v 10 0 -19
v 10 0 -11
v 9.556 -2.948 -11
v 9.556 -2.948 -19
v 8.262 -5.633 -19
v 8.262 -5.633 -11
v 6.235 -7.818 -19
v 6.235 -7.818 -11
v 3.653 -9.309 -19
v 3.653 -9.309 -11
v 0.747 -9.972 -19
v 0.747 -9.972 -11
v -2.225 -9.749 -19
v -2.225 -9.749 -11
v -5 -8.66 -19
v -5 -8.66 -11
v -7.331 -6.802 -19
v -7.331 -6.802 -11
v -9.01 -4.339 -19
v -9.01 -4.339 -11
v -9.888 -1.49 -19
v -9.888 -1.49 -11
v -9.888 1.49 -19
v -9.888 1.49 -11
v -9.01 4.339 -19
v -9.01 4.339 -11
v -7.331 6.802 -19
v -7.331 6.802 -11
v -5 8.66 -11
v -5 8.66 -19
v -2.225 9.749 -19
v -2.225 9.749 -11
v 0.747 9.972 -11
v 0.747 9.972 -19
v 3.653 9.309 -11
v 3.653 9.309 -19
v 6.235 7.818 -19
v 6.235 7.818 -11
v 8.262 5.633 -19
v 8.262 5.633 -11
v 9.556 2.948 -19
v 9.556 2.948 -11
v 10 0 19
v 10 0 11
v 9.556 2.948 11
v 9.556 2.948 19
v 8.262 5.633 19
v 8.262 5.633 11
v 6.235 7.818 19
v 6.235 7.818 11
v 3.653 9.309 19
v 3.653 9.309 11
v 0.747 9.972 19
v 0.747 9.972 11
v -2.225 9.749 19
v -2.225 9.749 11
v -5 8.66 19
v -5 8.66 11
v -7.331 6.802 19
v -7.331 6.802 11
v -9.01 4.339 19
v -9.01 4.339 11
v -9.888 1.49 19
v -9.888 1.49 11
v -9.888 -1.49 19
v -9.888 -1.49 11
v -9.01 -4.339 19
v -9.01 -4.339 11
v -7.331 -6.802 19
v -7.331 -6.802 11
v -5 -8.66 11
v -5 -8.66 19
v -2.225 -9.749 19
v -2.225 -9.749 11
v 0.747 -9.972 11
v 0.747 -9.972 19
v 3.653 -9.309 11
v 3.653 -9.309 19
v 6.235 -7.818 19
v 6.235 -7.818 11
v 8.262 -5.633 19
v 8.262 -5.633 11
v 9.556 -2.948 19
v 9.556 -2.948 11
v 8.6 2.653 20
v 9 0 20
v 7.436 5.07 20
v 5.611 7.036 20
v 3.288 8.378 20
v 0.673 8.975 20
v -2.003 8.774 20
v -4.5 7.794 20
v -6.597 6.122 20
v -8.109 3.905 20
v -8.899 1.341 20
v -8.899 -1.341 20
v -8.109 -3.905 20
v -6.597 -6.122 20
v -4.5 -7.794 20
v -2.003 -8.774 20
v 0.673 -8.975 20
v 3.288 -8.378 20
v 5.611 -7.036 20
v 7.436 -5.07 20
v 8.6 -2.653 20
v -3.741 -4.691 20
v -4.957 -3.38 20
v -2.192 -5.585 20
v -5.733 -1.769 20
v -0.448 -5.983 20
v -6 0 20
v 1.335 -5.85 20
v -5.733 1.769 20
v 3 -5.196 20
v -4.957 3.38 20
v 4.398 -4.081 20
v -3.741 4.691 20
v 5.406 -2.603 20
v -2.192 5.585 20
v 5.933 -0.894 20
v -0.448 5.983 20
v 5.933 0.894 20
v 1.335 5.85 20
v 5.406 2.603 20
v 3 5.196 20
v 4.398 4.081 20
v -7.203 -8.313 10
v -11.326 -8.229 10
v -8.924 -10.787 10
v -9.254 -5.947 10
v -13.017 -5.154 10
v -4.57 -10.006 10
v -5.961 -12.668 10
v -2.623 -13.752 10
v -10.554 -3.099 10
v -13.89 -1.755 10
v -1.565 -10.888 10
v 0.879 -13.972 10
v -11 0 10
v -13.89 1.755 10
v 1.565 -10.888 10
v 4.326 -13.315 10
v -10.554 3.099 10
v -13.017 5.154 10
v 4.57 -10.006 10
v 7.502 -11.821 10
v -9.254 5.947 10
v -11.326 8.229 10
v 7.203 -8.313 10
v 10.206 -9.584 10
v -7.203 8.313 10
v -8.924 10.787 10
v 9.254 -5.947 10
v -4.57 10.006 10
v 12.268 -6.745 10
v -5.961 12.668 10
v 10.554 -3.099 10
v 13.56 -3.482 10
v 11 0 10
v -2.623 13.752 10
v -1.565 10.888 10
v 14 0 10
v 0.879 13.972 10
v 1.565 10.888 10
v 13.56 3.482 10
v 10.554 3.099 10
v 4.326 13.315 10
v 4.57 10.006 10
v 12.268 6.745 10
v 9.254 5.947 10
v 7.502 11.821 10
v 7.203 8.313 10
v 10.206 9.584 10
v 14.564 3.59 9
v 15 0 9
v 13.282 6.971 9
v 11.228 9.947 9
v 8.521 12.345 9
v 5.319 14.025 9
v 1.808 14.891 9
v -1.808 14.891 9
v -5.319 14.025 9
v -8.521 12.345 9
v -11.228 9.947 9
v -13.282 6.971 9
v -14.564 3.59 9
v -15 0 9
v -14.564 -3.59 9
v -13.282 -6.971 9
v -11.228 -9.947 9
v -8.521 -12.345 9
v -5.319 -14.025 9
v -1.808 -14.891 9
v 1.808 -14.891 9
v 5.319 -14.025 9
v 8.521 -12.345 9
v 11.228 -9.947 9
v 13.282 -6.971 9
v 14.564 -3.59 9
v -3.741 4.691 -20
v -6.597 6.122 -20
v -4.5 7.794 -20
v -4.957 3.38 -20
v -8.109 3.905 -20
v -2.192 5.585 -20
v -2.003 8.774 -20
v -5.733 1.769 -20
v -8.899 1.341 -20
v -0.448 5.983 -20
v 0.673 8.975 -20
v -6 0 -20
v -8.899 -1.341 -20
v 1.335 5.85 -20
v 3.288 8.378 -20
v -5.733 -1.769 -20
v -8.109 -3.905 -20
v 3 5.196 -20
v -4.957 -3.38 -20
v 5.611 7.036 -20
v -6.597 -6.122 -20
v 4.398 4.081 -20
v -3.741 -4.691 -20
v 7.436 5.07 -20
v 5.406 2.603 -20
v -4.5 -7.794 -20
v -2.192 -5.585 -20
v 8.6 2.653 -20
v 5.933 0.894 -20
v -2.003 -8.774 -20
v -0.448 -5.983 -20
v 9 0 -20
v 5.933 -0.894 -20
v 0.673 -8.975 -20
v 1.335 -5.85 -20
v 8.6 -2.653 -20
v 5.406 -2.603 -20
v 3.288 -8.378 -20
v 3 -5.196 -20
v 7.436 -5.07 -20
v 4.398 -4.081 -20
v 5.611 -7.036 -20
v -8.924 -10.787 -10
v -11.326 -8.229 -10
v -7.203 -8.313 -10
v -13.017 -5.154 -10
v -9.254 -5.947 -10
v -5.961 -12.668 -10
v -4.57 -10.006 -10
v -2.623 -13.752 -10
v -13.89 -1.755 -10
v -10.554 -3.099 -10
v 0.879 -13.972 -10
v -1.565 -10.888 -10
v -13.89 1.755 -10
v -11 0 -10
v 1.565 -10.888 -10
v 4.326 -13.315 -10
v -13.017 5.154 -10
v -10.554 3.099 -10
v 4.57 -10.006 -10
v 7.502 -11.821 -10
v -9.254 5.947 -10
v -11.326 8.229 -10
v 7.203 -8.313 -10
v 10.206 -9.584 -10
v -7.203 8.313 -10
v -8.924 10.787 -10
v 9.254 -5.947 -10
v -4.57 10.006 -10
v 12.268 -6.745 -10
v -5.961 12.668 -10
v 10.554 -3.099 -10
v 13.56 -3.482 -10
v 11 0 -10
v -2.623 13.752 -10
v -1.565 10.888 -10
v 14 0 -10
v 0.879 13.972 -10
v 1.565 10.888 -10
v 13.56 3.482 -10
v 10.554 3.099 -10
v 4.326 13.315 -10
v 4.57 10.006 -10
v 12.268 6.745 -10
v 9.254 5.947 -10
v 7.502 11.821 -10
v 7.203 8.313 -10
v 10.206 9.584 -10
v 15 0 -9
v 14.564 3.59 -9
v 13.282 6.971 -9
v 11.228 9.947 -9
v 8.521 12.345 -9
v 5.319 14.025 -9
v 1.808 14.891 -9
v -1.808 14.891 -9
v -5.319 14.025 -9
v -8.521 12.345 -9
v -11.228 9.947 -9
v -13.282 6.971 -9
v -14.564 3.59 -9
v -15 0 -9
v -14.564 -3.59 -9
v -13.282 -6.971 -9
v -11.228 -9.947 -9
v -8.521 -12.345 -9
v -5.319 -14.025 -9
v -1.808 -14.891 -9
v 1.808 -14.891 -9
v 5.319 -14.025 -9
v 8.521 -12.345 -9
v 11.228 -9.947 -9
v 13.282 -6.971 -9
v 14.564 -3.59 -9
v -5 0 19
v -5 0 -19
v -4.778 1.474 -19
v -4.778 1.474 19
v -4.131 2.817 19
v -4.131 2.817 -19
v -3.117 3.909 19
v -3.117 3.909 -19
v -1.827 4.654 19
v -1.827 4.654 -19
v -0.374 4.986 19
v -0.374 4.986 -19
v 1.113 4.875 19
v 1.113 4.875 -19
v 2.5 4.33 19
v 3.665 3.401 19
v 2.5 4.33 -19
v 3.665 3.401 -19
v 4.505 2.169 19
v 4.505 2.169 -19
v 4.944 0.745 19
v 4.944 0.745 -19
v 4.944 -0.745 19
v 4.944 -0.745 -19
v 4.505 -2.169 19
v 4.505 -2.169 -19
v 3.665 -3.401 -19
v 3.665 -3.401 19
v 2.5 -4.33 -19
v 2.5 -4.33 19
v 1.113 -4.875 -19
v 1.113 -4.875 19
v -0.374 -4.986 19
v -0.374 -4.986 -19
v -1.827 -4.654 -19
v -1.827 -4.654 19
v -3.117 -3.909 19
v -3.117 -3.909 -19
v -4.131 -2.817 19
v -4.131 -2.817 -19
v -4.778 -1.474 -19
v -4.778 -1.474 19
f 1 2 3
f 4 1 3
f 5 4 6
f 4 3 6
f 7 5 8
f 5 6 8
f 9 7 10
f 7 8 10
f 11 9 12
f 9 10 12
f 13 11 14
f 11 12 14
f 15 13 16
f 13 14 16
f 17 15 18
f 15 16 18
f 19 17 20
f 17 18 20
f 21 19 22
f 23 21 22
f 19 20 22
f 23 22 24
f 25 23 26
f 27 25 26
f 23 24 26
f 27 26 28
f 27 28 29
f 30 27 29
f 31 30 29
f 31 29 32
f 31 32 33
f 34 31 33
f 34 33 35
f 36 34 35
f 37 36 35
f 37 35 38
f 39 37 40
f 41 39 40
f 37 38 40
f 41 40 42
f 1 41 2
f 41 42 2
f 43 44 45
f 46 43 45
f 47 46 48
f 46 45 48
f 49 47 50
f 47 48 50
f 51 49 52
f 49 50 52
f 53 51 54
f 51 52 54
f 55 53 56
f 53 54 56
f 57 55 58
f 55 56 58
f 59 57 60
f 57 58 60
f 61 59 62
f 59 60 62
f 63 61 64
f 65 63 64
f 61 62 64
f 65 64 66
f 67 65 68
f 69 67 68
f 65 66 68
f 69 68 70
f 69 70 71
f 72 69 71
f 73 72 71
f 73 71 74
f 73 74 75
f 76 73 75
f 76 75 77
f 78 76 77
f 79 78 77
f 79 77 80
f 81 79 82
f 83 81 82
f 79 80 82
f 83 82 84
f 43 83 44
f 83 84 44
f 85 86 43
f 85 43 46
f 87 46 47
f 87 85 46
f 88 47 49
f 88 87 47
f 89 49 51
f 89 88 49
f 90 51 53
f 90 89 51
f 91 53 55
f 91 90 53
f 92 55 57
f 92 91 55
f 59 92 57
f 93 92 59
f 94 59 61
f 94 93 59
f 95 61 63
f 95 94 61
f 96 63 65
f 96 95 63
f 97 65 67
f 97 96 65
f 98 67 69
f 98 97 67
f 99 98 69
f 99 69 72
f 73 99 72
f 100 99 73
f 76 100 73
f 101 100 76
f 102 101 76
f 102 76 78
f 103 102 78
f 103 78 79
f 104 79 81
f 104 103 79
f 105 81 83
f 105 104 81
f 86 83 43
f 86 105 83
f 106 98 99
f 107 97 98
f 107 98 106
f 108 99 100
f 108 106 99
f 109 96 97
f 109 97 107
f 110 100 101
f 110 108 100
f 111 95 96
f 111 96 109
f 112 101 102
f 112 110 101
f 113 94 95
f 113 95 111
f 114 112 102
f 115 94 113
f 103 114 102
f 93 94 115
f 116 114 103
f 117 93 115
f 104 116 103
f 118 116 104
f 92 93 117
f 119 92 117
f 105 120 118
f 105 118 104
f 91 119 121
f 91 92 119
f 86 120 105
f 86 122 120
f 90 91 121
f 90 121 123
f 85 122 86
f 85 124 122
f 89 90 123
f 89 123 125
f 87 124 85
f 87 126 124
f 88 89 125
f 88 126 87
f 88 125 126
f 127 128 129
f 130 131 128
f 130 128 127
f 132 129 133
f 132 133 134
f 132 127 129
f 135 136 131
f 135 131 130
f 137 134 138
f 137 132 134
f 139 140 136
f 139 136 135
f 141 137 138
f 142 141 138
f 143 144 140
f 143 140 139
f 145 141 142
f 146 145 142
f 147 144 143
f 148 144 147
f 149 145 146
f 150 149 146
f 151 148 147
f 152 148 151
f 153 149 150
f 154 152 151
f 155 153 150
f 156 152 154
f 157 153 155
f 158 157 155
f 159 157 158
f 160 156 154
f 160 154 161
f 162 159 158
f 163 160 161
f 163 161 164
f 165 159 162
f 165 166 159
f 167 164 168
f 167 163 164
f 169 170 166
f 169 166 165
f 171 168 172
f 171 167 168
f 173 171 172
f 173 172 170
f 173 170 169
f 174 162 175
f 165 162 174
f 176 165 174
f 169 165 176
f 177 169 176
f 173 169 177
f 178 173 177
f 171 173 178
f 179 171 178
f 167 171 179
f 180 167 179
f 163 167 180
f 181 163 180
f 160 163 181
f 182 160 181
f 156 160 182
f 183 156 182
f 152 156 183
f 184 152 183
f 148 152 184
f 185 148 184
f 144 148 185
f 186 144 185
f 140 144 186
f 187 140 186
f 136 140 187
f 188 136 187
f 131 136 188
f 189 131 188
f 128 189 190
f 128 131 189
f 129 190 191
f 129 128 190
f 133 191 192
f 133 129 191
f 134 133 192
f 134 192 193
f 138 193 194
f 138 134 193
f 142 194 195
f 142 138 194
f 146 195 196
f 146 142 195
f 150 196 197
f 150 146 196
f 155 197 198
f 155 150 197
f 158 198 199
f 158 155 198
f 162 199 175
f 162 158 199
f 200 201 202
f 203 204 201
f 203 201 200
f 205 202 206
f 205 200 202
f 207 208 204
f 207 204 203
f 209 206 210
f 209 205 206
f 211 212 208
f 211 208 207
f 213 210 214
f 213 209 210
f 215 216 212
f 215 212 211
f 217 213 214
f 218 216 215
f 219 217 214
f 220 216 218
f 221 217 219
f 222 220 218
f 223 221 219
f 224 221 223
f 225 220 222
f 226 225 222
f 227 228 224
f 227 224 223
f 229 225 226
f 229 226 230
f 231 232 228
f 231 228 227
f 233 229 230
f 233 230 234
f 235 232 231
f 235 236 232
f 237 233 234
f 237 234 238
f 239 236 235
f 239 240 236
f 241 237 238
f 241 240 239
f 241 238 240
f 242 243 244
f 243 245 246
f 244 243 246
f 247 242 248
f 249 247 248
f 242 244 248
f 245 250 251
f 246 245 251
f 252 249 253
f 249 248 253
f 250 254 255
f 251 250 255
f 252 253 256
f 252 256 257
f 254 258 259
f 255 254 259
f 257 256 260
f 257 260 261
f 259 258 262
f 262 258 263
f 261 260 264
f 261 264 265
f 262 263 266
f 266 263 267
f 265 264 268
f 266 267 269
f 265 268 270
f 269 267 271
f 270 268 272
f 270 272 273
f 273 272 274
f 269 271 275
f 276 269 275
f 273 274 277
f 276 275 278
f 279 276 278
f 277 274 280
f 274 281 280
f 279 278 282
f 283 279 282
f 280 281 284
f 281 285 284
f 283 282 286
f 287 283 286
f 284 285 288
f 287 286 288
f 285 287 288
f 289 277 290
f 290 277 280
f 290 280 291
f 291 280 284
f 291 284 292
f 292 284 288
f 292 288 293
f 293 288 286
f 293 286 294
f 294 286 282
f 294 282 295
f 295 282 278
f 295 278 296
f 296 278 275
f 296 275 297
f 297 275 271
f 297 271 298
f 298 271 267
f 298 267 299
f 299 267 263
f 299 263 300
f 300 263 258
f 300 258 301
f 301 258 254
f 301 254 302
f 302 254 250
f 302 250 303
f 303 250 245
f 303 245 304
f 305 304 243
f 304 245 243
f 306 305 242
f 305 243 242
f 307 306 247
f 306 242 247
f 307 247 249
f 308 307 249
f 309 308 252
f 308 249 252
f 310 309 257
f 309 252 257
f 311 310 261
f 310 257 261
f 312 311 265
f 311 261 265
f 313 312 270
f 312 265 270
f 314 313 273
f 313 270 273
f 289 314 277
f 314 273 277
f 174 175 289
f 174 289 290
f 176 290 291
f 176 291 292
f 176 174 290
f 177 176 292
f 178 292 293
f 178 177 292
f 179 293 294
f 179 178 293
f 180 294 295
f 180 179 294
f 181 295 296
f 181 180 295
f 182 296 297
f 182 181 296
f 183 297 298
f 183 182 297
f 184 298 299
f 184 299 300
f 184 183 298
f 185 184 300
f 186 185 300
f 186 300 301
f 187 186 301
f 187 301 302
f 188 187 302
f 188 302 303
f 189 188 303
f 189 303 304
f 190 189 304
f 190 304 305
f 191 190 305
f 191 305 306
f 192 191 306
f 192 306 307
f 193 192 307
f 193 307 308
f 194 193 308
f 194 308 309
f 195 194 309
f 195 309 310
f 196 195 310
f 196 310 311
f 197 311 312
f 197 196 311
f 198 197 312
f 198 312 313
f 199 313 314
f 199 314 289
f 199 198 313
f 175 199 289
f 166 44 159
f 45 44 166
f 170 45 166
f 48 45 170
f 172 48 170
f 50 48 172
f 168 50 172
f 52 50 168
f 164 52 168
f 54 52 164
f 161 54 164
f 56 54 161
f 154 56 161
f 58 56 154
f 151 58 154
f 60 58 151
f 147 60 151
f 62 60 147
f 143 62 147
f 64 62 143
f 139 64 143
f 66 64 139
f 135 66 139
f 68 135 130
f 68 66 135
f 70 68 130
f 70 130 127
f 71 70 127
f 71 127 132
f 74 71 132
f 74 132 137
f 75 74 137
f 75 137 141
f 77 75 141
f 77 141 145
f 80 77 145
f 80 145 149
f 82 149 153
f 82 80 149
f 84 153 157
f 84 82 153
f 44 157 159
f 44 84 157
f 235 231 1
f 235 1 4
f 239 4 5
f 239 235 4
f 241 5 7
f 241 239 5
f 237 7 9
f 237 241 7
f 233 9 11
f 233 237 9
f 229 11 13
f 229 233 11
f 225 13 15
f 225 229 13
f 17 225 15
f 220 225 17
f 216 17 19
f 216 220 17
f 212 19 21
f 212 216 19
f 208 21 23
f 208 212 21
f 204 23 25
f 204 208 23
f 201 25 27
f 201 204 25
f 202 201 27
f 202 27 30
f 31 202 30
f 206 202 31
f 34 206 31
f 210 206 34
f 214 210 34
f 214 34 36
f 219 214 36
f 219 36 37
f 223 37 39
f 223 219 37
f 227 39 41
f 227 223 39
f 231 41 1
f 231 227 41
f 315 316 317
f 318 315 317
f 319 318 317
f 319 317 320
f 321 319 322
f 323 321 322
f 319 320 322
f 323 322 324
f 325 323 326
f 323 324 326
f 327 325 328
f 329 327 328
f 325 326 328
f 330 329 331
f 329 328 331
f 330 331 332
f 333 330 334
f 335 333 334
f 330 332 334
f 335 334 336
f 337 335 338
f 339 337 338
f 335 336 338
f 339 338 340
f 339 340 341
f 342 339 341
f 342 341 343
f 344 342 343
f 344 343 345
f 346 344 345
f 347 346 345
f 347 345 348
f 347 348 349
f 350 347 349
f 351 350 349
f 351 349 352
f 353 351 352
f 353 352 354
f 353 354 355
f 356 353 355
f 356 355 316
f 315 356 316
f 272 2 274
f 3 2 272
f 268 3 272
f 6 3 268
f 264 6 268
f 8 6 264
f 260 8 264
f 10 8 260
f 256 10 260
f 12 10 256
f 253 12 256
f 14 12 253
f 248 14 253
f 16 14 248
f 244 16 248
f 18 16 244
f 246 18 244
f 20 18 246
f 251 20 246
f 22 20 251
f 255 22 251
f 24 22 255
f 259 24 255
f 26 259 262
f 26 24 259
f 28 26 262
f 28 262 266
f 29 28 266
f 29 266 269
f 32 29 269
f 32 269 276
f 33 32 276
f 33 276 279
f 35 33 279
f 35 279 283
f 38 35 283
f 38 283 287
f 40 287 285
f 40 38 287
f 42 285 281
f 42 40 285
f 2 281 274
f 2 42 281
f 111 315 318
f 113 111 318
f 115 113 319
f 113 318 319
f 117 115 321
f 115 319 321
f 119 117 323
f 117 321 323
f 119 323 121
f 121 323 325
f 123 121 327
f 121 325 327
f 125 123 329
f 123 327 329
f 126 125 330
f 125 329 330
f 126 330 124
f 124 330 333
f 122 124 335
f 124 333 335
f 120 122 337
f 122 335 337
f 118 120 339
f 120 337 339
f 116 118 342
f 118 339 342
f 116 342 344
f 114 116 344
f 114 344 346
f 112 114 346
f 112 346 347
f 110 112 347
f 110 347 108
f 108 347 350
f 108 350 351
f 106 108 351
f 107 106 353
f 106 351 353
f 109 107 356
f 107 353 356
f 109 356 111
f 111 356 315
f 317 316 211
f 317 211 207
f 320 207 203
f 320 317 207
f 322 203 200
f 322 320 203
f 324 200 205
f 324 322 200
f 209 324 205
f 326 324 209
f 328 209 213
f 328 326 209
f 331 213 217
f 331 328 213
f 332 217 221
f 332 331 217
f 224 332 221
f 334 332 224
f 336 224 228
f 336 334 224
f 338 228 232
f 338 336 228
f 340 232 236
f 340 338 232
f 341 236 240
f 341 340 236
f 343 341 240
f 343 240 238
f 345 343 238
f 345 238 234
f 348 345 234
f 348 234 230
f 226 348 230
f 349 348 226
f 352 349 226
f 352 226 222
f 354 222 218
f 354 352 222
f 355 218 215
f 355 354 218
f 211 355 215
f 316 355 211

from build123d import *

# Parameters (mm, degrees)
F0_R          = 15
F1_DEPTH      = 10
F1_DEPTH_BACK = 10
F2_R          = 10
F3_DEPTH      = 10
F4_R          = 10
F5_DEPTH      = 10
F7_D          = 10
F8_SIZE       = 1


with BuildPart() as f1:
    # F0 (on Top) → F1 (new body, two sides)
    with BuildSketch(Plane.XY) as f1_sk:
        Circle(F0_R)
    extrude(amount=F1_DEPTH)
    extrude(f1_sk.sketch, amount=-F1_DEPTH_BACK)

    # F2 (on face) → F3 (join)
    with BuildSketch(Plane.XY.offset(10)):
        Circle(F2_R)
    extrude(amount=F3_DEPTH)

    # F4 (on face) → F5 (join)
    with BuildSketch(Plane(origin=(0, 0, -10), x_dir=(1, 0, 0), z_dir=(0, 0, -1))):
        Circle(F4_R)
    extrude(amount=F5_DEPTH)

    # F7 (through all)
    with Locations(Plane.XY.offset(20)):
        with Locations((0, 0)):
            Hole(F7_D / 2)

    # F8
    f8_edges = [f1.edges().sort_by_distance(p)[0] for p in [
        (-10, 0, 20),
        (-5, 0, 20),
        (-15, 0, 10),
        (-10, 0, 10),
        (-15, 0, -10),
        (-10, 0, -10),
        (-10, 0, -20),
        (-5, 0, -20),
    ]]
    chamfer(f8_edges, length=F8_SIZE)


solid = f1.part
